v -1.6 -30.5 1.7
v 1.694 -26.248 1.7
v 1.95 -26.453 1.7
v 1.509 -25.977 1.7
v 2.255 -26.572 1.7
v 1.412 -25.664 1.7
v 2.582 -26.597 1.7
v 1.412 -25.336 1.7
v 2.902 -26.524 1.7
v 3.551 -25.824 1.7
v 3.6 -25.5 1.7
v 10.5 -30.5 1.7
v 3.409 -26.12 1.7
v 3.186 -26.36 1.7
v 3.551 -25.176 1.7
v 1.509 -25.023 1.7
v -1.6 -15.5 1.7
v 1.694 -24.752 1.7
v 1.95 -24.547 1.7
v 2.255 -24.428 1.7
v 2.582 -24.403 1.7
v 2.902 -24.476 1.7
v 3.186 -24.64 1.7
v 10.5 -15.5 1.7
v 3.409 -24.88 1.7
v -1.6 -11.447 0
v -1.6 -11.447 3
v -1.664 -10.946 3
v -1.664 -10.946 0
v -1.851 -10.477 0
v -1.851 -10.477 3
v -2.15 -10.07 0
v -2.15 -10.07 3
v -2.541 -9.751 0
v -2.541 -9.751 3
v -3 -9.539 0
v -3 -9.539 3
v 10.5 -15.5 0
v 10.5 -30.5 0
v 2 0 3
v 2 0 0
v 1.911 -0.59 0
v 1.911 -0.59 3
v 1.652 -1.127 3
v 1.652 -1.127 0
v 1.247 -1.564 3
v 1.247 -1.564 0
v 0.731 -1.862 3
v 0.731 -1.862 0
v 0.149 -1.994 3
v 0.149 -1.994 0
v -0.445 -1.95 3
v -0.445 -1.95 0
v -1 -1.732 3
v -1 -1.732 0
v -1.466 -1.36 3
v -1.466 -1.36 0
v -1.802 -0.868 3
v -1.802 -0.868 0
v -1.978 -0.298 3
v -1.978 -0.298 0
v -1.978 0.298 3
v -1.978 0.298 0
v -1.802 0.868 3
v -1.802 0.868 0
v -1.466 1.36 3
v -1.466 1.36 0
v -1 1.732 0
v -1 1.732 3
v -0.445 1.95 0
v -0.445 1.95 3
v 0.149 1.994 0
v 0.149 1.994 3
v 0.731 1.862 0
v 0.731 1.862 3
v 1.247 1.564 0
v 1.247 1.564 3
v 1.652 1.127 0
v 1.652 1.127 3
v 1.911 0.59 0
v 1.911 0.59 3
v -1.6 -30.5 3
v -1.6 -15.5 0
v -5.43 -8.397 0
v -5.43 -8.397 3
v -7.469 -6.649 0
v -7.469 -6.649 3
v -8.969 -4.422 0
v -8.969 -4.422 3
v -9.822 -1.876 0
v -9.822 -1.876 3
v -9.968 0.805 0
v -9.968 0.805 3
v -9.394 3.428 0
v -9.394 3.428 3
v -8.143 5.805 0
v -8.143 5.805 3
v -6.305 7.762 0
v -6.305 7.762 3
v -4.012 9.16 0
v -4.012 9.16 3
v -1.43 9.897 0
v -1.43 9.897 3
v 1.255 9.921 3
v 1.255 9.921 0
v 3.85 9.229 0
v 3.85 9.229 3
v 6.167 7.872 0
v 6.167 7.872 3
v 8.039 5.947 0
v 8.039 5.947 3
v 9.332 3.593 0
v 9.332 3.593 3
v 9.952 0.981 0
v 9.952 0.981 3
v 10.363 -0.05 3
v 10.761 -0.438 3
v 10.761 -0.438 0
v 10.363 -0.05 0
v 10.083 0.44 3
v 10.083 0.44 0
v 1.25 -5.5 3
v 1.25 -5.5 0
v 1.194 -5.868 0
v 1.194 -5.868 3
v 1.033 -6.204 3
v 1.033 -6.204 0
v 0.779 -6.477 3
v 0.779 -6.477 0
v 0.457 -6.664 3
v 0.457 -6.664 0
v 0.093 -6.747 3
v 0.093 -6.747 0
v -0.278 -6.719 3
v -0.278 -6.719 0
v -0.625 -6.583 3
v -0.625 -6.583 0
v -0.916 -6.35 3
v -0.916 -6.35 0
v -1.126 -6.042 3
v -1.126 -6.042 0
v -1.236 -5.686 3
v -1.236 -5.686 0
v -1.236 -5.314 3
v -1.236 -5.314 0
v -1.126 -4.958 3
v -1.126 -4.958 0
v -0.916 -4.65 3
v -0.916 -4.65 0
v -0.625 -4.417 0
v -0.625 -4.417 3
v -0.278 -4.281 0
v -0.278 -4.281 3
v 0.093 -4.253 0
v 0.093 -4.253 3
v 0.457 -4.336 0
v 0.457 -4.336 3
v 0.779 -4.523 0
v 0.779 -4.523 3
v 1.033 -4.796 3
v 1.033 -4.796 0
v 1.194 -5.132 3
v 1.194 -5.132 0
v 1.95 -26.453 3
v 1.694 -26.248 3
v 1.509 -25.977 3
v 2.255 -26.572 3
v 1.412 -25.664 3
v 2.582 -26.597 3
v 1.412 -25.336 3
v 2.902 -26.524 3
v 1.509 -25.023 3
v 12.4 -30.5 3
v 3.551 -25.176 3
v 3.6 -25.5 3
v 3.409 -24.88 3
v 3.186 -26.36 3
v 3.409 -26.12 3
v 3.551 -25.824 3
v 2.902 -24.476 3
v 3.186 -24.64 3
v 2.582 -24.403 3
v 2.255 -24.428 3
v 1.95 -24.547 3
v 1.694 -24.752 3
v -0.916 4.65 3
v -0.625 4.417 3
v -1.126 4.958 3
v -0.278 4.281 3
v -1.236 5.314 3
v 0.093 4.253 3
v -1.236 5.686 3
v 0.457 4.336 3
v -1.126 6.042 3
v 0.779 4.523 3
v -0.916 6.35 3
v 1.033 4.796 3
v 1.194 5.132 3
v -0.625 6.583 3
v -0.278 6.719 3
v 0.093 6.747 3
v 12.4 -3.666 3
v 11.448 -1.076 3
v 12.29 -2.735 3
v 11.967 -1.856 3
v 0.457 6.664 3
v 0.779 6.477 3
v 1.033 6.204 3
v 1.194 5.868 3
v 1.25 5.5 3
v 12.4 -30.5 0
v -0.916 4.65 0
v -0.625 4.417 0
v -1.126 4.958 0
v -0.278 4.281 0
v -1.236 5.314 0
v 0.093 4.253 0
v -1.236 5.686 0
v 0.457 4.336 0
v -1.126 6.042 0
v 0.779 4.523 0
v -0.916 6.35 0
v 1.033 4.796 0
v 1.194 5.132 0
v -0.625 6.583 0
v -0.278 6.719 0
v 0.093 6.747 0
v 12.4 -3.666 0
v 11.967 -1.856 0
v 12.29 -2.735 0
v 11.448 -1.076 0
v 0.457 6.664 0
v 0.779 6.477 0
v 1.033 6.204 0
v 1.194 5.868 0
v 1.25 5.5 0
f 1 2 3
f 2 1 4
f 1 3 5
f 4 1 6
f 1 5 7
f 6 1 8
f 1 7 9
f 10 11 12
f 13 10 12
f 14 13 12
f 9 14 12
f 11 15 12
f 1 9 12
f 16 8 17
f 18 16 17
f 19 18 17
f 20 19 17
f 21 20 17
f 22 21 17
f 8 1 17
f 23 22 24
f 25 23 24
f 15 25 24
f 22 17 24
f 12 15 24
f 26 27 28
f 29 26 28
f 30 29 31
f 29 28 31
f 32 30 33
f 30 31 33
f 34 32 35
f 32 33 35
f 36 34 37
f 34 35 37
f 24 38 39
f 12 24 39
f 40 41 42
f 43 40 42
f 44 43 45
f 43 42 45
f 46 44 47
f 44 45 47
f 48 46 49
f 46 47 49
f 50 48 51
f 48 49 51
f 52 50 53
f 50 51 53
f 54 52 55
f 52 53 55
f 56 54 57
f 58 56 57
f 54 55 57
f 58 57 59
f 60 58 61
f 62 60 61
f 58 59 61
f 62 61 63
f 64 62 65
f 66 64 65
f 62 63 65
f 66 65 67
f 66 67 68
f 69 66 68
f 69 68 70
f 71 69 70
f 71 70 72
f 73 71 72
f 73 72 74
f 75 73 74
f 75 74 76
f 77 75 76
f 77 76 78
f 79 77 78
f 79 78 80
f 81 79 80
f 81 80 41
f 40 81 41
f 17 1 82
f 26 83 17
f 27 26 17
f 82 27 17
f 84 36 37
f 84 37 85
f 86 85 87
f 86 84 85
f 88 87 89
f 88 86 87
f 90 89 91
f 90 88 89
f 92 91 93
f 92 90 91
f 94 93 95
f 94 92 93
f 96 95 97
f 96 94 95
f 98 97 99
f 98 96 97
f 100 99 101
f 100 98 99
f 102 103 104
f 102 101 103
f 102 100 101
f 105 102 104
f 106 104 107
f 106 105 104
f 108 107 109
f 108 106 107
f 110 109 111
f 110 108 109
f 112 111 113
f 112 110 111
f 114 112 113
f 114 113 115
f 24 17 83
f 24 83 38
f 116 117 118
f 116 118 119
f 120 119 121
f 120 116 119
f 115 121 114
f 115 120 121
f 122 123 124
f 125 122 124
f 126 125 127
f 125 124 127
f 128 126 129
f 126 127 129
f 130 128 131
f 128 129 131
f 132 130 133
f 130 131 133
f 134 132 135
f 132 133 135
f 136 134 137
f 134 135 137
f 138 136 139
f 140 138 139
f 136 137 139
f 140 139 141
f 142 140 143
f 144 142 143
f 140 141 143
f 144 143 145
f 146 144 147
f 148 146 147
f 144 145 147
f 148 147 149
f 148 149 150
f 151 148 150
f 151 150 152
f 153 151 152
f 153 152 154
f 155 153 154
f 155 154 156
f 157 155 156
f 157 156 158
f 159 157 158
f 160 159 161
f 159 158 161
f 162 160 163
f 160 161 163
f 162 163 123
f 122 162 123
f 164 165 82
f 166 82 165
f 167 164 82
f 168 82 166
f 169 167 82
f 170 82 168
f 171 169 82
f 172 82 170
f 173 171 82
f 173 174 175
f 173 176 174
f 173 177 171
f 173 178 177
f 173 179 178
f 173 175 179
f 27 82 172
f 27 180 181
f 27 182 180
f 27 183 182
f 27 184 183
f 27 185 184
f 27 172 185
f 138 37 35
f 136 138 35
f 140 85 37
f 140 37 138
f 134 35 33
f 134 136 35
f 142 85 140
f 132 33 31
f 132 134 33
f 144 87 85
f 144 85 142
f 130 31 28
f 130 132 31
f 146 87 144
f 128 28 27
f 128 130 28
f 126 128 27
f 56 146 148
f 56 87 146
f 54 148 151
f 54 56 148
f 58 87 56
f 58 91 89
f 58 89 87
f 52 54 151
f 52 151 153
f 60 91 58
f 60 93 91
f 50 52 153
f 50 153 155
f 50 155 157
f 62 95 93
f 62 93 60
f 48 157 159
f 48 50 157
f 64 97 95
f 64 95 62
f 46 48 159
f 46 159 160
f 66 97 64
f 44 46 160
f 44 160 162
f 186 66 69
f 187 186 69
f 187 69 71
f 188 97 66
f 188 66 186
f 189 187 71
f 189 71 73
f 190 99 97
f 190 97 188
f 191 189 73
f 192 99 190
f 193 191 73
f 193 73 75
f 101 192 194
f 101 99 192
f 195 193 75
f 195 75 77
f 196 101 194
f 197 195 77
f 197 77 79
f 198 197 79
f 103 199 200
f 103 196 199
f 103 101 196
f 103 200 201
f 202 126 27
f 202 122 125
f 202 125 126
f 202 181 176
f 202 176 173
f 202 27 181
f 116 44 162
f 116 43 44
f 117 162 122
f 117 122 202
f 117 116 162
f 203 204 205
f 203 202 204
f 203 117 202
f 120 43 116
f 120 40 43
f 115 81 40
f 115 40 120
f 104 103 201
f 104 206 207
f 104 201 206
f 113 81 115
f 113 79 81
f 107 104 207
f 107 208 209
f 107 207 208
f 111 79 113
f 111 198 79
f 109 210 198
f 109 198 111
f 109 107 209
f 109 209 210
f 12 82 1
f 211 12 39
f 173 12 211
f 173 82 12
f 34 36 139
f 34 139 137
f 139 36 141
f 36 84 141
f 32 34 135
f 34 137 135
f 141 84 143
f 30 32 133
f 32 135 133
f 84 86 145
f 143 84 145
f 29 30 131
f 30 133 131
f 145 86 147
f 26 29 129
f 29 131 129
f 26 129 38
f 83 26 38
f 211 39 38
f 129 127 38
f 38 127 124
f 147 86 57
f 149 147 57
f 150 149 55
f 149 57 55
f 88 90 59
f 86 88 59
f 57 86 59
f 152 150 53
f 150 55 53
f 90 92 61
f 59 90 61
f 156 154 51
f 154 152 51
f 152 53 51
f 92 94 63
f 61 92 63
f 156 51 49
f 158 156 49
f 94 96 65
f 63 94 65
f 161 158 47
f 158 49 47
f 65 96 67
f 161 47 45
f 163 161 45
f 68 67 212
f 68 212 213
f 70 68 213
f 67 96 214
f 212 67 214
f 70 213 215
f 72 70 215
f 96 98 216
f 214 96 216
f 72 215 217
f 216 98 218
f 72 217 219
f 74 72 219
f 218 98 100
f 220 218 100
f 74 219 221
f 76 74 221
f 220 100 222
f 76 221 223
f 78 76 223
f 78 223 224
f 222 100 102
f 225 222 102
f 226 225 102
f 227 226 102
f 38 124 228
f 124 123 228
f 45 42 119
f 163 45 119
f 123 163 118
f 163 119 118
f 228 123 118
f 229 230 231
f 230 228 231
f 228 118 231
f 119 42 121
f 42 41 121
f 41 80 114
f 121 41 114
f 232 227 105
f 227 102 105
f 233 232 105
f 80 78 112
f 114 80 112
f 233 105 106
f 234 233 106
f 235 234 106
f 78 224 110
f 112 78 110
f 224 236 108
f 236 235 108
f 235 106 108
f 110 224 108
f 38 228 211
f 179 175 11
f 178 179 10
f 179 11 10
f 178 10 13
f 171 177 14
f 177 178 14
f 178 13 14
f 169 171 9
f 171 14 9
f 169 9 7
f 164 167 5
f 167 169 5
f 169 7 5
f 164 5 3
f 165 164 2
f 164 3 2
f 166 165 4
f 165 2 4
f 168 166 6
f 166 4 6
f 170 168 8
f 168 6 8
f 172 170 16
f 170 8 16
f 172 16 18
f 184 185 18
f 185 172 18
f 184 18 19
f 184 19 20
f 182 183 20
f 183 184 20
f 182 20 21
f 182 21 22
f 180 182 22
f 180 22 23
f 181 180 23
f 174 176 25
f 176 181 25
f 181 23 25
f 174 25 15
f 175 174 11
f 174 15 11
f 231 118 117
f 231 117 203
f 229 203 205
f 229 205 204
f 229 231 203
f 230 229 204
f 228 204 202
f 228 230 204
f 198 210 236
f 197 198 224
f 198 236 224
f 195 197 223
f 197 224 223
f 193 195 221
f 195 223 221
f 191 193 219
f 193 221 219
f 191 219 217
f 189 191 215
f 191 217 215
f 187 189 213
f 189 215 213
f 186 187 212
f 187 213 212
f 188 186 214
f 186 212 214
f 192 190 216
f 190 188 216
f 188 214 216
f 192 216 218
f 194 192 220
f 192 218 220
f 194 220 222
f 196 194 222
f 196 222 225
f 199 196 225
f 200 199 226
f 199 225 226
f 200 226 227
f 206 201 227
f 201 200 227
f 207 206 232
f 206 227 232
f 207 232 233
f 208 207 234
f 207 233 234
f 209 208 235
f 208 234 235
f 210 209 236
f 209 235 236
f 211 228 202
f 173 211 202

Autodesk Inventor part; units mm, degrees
ref_plane "YZ Plane" through (0, 0, 0) normal (1, 0, 0) x (0, 1, 0)
ref_plane "XZ Plane" through (0, 0, 0) normal (0, 1, 0) x (-1, 0, 0)
ref_plane "XY Plane" through (0, 0, 0) normal (0, 0, 1) x (1, 0, 0)
sketch "スケッチ1" plane through (0, 0, 0) normal (0, 0, 1) x (1, 0, 0)
  circle A0 centre (0, 0) radius 10
  line L0 (0, 0) -> (12.4, 0)
  line L1 (12.4, 0) -> (12.4, -45)
  line L2 (12.4, -45) -> (-1.6, -45)
  line L3 (-1.6, -45) -> (-1.6, 0)
  circle A1 centre (2.5, -25.5) radius 1.1
  circle A2 centre (2.5, -32) radius 1.7
  circle A3 centre (2.5, -42) radius 1.7
  circle A4 centre (0, 0) radius 5.5
  circle A5 centre (0, 5.5) radius 1.25
  circle A6 centre (0, -5.5) radius 1.25
  circle A7 centre (0, 0) radius 2
  line L4 (0, 0) -> (0, -45)
  line L5 (2.5, -25.5) -> (12.4, -25.5)
  point P0 (7.5, -6.6144)
  point P1 (-1.6, -9.8712)
  point P2 (10, 0)
  dimension "d0" = 20
  dimension "d3" = 12.4
  dimension "d4" = 45
  dimension "d5" = 14
  dimension "d6" = 2.2
  dimension "d7" = 3.4
  dimension "d8" = 3.4
  dimension "d9" = 11
  dimension "d10" = 2.5
  dimension "d11" = 2.5
  dimension "d12" = 4
  dimension "d16" = 2.5
  dimension "d17" = 2.5
  dimension "d18" = 2.5
  dimension "d19" = 9.9
  dimension "d37" = 25.5
extrude "押し出し1" add sketch "スケッチ1" along normal blind 3 contours L0 A4 A5 L3 A0 | L0 L1 L2 L4 A0 | A0 L4 A6 A4 L0 | L3 A4 A6 L4 A0 | A0 L4 L2 L3 | A4 A6 L4 A7 L0 | L0 A7 L3 A4 A5 | L3 A7 L4 A6 A4
fillet "フィレット1" radius 2 1 edges at (-1.6, -9.8712, 1.5)
fillet "フィレット2" radius 4 1 edges at (12.4, 0, 1.5)
fillet "フィレット3" radius 2 1 edges at (10, 0, 1.5)
sketch "スケッチ2" plane through (0, 0, 3) normal (0, 0, 1) x (1, 0, 0)
  line L0 (12.4, -45) -> (12.4, -3.6661) projected
  line L1 (12.4, -45) -> (12.4, -27)
  line L2 (12.4, -27) -> (-1.6, -27)
  line L3 (-1.6, -11.4473) -> (-1.6, -45) projected
  line L4 (-1.6, -27) -> (-1.6, -45)
  line L5 (-1.6, -45) -> (12.4, -45) projected
  line L6 (-1.6, -45) -> (12.4, -45)
  point P0 (0, 0)
  dimension "d22" = 18
extrude "押し出し2" cut sketch "スケッチ2" against normal blind 10
sketch "スケッチ3" plane through (0, 0, 3) normal (0, 0, 1) x (1, 0, 0)
  circle A0 centre (2.5, -25.5) radius 1.1 projected
  line L0 (2.5, -25.5) -> (2.5, -15.5)
  line L1 (2.5, -15.5) -> (10.5, -15.5)
  line L2 (10.5, -15.5) -> (10.5, -27)
  line L3 (-1.6, -27) -> (12.4, -27) projected
  point P0 (0, 0)
  dimension "d25" = 10
  dimension "d26" = 8
sketch "スケッチ5" plane through (-1.6, -27, 3) normal (0, -1, 0) x (1, 0, 0)
  line L0 (0, -3) -> (0, 0) projected
  line L1 (0, -1.5) -> (0, -1.3)
  line L2 (0, -1.3) -> (12.1, -1.3)
  line L3 (12.1, -1.3) -> (12.1, -1.7)
  line L4 (12.1, -1.7) -> (0, -1.7)
  line L5 (0, -1.7) -> (0, -1.5)
  point P0 (1.6, -3)
  point P1 (0, -1.7)
  dimension "d32" = 0.2
  dimension "d33" = 12.1
  dimension "d34" = 0.4
extrude "押し出し4" cut sketch "スケッチ5" against normal blind 11.5
sketch "スケッチ6" plane through (-1.6, -27, 3) normal (0, -1, 0) x (1, 0, 0)
  line L0 (12.3614, 0) -> (14, 0) projected
  line L1 (0, -3) -> (0, 0) projected
  line L2 (14, 0) -> (0, 0)
  line L3 (0, -1.3) -> (12.1, -1.3) projected
  line L4 (0, 0) -> (0, -1.3)
  line L5 (12.1, -1.3) -> (12.1, -1.7) projected
  line L6 (0, -1.3) -> (12.1, -1.3)
  line L7 (12.1, -1.7) -> (0, -1.7) projected
  line L8 (12.1, -1.3) -> (12.1, -1.7)
  line L9 (12.1, -1.7) -> (0, -1.7)
  line L10 (0, -1.7) -> (0, -3)
  line L11 (0, -3) -> (14, -3)
  line L12 (14, -3) -> (14, 0)
  point P0 (1.6, -3)
extrude "押し出し5" add sketch "スケッチ6" along normal blind 3.5 contours L0 L12 L11 L1 L7 L5 L3 L2
sketch "スケッチ7" plane through (0, 0, 0) normal (0, 0, -1) x (-1, 0, 0)
  line L0 (1.6, -11.4473) -> (1.6, -30.5) projected
  line L1 (1.6, -30.5) -> (1.6, -15.5)
  line L2 (-10.5, -15.5) -> (1.6, -15.5) projected
  line L3 (1.6, -15.5) -> (-10.5, -15.5)
  line L4 (-10.5, -15.5) -> (-10.5, -30.5)
  line L5 (-10.5, -30.5) -> (1.6, -30.5)
  point P0 (0, 0)
extrude "押し出し6" cut sketch "スケッチ7" against normal blind 1.5
properties part number "cutter_board_claws_endeffector_8_5_rotary-blade" material "ABS プラスチック"
